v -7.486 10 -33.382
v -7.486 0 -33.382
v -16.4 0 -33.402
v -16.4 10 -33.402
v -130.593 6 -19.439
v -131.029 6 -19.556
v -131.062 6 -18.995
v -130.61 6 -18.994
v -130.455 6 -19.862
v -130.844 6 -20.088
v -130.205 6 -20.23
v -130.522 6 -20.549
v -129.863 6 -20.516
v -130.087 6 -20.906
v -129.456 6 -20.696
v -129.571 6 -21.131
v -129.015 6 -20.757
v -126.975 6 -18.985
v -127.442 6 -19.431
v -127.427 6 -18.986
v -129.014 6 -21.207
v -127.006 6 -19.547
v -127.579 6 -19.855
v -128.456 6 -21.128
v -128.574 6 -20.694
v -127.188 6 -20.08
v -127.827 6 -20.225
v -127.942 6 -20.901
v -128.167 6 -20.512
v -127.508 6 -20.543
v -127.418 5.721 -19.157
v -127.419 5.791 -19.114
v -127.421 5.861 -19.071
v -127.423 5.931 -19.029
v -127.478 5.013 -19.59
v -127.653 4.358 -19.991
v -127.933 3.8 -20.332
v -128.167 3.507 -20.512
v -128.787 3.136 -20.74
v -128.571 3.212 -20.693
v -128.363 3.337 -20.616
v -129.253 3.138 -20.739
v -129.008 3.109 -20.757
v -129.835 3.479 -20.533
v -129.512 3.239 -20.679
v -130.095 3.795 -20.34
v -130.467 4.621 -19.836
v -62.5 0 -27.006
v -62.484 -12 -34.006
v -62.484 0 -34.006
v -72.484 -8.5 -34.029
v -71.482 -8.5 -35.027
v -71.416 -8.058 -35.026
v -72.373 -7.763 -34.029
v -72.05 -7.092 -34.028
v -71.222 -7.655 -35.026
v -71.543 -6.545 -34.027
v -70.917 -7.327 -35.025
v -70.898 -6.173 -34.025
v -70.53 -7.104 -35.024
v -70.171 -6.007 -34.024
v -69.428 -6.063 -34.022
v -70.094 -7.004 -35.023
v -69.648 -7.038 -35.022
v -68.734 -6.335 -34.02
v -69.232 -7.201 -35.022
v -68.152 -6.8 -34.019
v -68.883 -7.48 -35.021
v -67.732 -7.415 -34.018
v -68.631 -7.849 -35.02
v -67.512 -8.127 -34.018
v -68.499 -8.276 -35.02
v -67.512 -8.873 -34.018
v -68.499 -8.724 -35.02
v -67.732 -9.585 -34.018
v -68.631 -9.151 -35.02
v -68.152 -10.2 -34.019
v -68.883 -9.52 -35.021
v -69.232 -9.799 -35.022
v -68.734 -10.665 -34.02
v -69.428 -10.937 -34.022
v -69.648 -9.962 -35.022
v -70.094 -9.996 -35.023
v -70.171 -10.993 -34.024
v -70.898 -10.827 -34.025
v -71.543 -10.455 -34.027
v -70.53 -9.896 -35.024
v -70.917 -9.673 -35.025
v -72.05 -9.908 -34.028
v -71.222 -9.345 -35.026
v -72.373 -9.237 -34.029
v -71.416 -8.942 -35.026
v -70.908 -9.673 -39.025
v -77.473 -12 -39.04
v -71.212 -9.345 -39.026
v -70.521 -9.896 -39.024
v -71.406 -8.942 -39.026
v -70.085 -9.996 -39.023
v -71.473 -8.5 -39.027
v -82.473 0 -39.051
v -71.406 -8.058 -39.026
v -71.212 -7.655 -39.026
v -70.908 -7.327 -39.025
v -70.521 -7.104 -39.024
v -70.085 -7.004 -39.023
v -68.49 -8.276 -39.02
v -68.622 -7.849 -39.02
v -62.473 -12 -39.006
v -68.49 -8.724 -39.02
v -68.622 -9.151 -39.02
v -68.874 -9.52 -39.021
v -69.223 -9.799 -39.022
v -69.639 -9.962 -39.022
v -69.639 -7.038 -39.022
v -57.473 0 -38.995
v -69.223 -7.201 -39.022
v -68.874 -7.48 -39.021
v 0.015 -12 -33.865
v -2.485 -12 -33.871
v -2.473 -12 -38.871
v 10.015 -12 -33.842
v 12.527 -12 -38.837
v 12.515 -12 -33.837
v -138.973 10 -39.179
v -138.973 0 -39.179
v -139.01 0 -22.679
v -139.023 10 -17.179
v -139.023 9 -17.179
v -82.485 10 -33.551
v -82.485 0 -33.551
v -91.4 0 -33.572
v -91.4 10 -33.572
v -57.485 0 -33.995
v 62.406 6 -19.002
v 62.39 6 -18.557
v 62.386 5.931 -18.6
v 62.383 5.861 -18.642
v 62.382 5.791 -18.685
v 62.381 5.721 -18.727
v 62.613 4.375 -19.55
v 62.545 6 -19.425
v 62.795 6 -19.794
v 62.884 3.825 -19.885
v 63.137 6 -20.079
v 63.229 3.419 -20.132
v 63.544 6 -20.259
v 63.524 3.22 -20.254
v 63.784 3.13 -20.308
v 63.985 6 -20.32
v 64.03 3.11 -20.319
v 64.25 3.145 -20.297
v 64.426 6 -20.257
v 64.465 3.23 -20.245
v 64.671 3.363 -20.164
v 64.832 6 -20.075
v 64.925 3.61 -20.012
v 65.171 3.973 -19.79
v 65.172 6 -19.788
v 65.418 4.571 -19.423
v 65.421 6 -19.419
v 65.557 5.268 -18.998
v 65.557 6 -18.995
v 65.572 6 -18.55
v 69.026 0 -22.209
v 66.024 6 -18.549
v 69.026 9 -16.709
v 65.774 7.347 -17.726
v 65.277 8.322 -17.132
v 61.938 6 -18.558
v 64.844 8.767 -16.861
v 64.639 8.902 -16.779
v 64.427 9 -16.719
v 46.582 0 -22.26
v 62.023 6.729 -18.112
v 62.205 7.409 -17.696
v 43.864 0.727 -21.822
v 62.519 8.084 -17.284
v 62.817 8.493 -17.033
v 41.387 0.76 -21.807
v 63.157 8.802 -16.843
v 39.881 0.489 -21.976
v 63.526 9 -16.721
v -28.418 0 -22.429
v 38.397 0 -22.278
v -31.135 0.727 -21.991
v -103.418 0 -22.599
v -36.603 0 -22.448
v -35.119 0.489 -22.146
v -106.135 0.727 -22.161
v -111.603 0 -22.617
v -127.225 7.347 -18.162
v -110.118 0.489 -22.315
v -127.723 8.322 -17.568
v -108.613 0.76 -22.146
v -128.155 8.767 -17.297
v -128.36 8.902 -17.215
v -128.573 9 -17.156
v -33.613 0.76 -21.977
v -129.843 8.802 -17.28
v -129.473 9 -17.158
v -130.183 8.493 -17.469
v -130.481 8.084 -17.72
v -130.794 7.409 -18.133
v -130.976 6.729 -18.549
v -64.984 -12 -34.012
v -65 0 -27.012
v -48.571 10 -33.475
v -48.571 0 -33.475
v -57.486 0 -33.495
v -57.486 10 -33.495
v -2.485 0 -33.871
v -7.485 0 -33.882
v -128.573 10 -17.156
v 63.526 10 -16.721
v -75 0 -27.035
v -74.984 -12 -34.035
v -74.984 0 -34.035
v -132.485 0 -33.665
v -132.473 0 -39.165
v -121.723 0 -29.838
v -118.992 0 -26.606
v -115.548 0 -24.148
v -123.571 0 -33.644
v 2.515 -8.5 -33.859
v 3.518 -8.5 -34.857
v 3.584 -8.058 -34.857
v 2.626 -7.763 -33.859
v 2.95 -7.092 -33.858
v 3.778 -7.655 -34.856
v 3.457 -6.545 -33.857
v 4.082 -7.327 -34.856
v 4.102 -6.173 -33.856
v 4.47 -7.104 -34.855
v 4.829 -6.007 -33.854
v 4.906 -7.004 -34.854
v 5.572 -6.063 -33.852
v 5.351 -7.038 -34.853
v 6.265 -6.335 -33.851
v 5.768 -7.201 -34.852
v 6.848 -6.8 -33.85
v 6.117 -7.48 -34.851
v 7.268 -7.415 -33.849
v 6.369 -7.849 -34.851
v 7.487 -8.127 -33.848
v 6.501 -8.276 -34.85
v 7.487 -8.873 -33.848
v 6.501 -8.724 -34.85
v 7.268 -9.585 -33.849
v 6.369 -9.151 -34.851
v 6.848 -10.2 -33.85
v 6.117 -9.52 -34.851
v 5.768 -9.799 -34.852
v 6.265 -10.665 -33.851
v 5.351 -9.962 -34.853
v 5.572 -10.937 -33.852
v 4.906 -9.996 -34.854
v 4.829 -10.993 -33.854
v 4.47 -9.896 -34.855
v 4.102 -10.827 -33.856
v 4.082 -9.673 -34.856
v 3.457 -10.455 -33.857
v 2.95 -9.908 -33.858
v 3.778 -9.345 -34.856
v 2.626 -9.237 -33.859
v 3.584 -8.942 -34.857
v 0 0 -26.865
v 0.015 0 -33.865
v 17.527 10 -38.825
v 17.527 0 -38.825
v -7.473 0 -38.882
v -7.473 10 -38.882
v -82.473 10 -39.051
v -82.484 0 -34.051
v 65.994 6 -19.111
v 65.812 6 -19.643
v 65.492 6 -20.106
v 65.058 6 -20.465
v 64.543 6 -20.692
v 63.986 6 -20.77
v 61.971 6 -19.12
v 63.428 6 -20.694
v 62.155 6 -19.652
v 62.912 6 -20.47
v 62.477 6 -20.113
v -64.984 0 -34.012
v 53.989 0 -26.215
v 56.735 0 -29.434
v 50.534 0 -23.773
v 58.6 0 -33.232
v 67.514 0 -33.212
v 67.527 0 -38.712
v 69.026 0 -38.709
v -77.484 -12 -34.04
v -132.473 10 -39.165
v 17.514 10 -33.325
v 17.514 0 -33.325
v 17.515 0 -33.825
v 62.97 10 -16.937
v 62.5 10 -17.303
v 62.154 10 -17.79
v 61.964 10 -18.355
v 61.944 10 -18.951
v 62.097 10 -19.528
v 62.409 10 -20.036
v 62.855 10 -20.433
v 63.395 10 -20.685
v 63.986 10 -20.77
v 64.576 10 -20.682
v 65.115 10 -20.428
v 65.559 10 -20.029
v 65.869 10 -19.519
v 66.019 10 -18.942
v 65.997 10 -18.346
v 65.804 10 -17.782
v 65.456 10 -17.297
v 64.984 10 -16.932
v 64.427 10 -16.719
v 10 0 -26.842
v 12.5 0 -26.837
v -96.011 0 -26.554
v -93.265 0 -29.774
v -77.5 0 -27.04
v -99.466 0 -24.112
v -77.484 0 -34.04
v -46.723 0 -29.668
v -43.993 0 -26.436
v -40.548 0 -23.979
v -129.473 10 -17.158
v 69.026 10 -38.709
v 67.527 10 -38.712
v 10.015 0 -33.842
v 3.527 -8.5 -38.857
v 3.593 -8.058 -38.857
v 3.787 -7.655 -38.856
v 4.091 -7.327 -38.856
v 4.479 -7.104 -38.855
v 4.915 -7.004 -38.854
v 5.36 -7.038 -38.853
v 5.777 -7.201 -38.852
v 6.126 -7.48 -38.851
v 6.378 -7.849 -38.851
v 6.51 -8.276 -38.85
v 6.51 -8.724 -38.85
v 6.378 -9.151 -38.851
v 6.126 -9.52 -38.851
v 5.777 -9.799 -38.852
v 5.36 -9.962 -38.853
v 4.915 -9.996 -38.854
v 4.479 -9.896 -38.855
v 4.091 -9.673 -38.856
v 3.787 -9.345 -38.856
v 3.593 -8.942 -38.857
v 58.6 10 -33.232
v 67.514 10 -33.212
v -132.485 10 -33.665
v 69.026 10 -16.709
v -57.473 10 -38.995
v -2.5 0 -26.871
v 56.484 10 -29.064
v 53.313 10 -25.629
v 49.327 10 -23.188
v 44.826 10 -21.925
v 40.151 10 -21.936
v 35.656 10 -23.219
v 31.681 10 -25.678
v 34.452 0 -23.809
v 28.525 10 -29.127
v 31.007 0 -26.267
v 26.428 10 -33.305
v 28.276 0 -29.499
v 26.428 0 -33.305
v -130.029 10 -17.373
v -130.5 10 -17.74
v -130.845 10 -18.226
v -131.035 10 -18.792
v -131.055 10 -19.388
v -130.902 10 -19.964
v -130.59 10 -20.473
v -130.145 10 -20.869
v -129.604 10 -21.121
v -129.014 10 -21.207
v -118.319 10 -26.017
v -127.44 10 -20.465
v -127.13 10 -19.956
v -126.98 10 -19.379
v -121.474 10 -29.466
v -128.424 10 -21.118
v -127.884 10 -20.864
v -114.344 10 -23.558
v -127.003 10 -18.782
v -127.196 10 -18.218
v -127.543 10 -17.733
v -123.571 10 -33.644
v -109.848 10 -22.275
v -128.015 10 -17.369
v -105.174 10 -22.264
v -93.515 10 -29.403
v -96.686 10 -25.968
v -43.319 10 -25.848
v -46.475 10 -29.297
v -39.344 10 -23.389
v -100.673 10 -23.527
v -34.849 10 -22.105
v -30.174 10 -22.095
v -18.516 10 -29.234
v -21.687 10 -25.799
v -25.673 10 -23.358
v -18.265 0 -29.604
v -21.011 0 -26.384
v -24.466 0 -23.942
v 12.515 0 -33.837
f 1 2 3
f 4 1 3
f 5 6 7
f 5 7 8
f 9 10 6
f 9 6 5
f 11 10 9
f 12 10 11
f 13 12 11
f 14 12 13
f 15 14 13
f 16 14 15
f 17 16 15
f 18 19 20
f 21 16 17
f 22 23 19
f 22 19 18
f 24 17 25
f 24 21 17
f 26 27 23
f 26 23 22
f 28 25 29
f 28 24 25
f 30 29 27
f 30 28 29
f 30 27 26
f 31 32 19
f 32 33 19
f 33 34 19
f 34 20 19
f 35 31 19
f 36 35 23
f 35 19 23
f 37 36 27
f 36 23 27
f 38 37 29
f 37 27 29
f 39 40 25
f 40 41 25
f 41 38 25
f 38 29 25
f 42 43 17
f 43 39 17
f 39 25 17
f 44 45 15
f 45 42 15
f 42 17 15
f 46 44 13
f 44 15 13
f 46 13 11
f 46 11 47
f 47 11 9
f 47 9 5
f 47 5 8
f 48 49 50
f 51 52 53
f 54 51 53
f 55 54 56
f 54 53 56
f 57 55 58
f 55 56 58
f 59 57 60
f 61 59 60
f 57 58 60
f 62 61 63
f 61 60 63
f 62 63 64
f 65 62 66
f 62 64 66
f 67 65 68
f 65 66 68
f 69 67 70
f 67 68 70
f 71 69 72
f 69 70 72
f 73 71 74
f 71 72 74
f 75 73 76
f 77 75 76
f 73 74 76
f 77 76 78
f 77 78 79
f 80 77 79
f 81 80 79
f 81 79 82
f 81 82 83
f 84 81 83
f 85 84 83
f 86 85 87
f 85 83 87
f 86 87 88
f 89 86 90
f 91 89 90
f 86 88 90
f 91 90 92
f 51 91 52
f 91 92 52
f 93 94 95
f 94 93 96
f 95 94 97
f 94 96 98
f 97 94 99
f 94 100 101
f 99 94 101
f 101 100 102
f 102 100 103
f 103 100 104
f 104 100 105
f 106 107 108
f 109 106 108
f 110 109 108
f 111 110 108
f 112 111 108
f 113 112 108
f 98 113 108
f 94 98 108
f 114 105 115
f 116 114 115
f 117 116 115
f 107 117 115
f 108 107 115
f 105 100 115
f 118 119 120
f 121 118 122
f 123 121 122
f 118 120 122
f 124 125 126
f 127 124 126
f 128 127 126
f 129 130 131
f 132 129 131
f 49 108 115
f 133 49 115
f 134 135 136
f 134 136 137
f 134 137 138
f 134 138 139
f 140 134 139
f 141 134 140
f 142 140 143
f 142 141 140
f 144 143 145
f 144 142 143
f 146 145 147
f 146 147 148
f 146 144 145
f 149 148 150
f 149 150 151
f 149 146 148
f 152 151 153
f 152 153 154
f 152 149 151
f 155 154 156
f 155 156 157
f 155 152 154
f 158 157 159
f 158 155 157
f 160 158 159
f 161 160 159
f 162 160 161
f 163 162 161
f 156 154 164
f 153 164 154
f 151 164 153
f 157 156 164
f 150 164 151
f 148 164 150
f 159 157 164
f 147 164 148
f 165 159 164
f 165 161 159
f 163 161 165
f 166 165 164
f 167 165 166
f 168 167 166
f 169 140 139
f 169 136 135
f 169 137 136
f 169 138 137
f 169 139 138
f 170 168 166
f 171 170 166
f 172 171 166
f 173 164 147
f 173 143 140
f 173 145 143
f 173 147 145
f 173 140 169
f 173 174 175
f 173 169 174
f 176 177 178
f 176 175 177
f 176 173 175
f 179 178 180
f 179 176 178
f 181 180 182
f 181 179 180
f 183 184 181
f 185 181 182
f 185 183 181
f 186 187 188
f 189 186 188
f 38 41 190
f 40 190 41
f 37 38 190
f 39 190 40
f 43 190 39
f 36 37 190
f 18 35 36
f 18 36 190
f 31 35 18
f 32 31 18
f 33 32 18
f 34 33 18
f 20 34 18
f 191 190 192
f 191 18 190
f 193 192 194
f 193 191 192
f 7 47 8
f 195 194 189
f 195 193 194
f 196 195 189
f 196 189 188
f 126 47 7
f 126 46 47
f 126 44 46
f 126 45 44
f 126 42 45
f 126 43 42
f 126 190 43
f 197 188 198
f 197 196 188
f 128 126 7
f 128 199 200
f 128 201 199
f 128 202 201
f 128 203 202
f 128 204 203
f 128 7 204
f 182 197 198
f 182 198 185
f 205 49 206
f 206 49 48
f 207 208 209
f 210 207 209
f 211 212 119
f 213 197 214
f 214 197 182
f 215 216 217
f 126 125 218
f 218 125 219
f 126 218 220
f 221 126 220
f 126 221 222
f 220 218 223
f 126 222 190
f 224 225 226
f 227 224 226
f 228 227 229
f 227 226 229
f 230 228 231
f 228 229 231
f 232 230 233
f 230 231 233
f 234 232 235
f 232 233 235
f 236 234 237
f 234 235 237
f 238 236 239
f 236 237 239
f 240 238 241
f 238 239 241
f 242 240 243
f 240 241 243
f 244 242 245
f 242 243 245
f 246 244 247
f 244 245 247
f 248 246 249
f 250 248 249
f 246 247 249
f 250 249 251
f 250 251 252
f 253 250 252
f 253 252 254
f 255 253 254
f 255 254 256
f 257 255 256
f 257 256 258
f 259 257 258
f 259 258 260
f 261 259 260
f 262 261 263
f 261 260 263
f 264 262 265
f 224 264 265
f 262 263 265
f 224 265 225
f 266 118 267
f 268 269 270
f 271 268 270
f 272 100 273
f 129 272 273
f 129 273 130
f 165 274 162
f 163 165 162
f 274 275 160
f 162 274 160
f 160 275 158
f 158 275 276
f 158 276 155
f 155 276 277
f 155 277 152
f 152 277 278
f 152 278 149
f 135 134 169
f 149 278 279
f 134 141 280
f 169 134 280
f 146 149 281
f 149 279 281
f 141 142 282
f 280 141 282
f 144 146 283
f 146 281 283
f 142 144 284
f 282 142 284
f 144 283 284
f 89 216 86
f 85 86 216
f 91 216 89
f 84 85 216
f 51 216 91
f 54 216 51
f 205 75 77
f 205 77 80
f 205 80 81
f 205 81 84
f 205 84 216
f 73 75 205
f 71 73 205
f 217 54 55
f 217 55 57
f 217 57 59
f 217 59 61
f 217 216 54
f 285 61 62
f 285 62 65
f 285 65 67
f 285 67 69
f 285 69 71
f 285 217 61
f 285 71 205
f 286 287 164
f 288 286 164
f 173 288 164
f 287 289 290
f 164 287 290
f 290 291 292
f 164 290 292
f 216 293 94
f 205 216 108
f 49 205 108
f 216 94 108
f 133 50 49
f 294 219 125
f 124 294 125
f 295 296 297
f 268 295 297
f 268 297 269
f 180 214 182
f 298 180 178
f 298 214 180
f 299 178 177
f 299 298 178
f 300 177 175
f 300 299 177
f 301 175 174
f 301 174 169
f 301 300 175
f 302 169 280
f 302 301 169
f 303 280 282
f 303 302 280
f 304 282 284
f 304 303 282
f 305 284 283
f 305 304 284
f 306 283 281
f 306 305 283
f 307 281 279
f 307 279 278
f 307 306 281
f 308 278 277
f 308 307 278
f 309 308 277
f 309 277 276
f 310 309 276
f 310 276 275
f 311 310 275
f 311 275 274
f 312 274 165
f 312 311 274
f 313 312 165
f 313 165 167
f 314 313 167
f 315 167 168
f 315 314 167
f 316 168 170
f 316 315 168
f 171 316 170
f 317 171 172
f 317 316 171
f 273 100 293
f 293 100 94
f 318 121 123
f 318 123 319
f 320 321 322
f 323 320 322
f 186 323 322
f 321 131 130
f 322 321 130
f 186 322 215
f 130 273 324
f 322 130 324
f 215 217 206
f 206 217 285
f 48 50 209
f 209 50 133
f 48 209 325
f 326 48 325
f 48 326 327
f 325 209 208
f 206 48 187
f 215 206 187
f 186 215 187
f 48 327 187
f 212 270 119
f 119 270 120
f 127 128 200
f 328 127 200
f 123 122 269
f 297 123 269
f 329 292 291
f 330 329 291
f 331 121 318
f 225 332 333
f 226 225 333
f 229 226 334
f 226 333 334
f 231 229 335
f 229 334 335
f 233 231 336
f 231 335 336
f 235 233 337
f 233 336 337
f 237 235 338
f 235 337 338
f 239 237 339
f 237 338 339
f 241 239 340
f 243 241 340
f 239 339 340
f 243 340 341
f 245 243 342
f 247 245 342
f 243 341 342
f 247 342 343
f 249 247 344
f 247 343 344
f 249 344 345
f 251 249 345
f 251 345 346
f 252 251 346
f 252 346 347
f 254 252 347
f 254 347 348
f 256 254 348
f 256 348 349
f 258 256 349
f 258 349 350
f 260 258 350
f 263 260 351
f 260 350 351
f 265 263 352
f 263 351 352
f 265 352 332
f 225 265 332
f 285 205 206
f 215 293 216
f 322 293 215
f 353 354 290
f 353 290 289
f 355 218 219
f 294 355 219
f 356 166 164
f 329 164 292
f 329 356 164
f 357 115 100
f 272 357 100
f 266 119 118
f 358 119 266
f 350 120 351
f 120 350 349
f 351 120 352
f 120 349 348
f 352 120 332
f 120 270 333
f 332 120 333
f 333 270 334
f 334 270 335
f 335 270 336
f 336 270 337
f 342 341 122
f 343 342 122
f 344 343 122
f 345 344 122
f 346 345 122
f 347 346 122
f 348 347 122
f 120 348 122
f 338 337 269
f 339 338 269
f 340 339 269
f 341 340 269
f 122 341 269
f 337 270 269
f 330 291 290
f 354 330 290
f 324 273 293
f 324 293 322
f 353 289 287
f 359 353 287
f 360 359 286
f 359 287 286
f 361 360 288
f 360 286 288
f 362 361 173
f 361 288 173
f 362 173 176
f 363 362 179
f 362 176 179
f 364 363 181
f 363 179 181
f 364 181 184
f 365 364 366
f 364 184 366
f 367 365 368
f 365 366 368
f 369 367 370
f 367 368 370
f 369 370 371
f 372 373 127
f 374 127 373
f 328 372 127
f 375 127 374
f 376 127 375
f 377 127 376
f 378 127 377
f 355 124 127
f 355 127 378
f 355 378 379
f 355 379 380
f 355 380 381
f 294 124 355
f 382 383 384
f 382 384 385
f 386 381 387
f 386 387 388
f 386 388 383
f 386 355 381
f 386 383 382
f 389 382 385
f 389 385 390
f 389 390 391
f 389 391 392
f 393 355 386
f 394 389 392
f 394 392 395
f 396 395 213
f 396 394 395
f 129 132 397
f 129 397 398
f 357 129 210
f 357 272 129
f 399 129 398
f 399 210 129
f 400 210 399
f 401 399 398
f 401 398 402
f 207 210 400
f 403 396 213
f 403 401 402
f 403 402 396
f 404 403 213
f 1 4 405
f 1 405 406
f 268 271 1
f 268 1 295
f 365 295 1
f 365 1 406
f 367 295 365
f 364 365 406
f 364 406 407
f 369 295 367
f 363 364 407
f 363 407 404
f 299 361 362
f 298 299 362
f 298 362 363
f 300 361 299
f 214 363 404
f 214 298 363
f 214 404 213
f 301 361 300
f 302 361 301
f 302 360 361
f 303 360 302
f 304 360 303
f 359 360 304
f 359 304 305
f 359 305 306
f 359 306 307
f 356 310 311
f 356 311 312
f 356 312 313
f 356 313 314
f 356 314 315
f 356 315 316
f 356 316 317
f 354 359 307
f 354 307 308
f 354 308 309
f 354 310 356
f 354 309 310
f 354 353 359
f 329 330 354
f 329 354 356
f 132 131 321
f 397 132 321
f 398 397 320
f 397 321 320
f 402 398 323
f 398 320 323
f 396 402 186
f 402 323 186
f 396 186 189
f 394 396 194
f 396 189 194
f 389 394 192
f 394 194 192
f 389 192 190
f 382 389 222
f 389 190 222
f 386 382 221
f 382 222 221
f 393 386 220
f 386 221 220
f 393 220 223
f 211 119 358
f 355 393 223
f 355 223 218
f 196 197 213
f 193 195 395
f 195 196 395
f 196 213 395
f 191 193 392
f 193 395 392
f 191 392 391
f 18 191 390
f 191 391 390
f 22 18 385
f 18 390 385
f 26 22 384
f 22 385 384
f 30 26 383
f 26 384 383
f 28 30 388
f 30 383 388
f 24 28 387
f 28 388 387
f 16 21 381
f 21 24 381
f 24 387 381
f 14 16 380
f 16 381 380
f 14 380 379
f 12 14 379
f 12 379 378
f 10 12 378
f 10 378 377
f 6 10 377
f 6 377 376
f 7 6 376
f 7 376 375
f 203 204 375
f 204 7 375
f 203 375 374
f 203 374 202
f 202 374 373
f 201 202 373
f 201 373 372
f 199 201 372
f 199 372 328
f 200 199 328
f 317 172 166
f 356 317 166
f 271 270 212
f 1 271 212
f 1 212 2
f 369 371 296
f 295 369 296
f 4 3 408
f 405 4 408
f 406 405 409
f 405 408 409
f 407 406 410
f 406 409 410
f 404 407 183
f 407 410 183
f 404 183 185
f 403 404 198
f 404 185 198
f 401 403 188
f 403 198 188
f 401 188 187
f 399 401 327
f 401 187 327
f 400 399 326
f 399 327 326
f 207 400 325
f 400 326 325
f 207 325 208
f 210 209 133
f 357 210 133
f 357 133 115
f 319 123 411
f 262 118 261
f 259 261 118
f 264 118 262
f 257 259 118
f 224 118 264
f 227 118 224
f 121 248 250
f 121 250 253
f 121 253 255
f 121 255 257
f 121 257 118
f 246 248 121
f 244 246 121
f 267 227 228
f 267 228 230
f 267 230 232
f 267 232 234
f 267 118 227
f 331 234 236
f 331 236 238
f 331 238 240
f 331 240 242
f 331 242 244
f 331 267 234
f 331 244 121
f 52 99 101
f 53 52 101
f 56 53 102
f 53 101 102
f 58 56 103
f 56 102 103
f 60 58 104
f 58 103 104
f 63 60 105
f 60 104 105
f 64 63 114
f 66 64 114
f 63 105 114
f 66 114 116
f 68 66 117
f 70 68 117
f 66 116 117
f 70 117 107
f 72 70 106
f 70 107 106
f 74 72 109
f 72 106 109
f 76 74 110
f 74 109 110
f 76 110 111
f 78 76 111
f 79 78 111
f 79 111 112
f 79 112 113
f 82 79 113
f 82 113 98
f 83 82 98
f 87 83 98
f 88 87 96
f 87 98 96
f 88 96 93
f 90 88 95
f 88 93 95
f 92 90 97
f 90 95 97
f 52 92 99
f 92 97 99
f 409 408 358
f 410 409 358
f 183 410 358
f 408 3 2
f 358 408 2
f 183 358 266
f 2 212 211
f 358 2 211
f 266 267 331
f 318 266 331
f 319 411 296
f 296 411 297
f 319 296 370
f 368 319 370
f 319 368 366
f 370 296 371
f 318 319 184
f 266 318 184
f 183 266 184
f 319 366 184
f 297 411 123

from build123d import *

# Parameters (mm, degrees)
BOSS_EXTRUDE3_DEPTH        = 10
SKETCH4_R                  = 1.5
BOSS_EXTRUDE4_DEPTH        = 5
RIB6_REACH                 = 158.985
SKETCH5_WALL_W             = 329.861950248
SKETCH5_WALL_H             = 2.5
CHAMFER2_SIZE              = 1
CHAMFER3_SIZE              = 5.5
CHAMFER3_SIZE_2            = 9
LPATTERN4_COUNT            = 2
LPATTERN4_PITCH            = 75
LPATTERN4_COPY_1_REACH     = 158.985
LPATTERN4_COPY_1_SKETCH_W  = 329.861950248
LPATTERN4_COPY_1_SKETCH_H  = 2.5
CHAMFER2_OF_LPATTERN4_SIZE = 1
SKETCH8_R                  = 2.05
CUT_EXTRUDE1_DEPTH         = 4
SKETCH9_R                  = 1.6
CUT_EXTRUDE2_DEPTH         = 5
SZKIC1_W                   = 8.551960468
SZKIC1_H                   = 23.590081372
WYTNIJ_WYCI_GNI_CIE3_DEPTH = 30.5


with BuildPart() as part:
    # Sketch2 → Boss-Extrude3 (new body)
    with BuildSketch(Plane(origin=(0, 0, 0), x_dir=(1, 0, 0), z_dir=(0, 1, 0))):
        with BuildLine():
            Line((-138.973021921, 39.179223473), (-139.022764358, 17.179279707))
            Line((-139.022764358, 17.179279707), (73.976691191, 16.697682479))
            Line((73.976691191, 16.697682479), (74.026978079, 38.697625014))
            Line((74.026978079, 38.697625014), (67.526578048, 38.712322585))
            Line((67.526578048, 38.712322585), (67.51414235, 33.212297518))
            Line((67.51414235, 33.212297518), (58.599731895, 33.232453229))
            ThreePointArc((58.599731895, 33.232453229), (42.488076808, 21.768891824), (26.428425, 33.305193378))
            Line((26.428425, 33.305193378), (17.51414235, 33.3253488))
            Line((17.51414235, 33.3253488), (17.526578048, 38.825373866))
            Line((17.526578048, 38.825373866), (-7.473230244, 38.881899074))
            Line((-7.473230244, 38.881899074), (-7.485665941, 33.381874007))
            Line((-7.485665941, 33.381874007), (-16.400076396, 33.402029717))
            ThreePointArc((-16.400076396, 33.402029717), (-32.511731484, 21.938468313), (-48.571383292, 33.474769867))
            Line((-48.571383292, 33.474769867), (-57.485665941, 33.494925288))
            Line((-57.485665941, 33.494925288), (-57.473230244, 38.994950355))
            Line((-57.473230244, 38.994950355), (-82.473038536, 39.051475562))
            Line((-82.473038536, 39.051475562), (-82.485474233, 33.551450496))
            Line((-82.485474233, 33.551450496), (-91.399884688, 33.571606206))
            ThreePointArc((-91.399884688, 33.571606206), (-107.511539776, 22.108044802), (-123.571191584, 33.644346356))
            Line((-123.571191584, 33.644346356), (-132.485474233, 33.664501777))
            Line((-132.485474233, 33.664501777), (-132.473038536, 39.164526844))
            Line((-132.473038536, 39.164526844), (-138.973021921, 39.179223473))
        make_face()
    extrude(amount=BOSS_EXTRUDE3_DEPTH)

    # Sketch4 → Boss-Extrude4 (add)
    with BuildSketch(Plane(origin=(0.087874316, 0, -38.864803222), x_dir=(-0.99999744389135, 0, -0.002261019850970016), z_dir=(0.002261019850970016, 0, -0.99999744389135))):
        Polygon((62.56118779, -12), (57.561251693, 0), (82.561123887, 0), (77.56118779, -12), align=None)
        with Locations((70.06118779, -8.5)):
            Circle(SKETCH4_R, mode=Mode.SUBTRACT)
    boss_extrude4 = extrude(amount=-BOSS_EXTRUDE4_DEPTH)

    # Sketch5 wall → Rib6 (add, up to next)
    with BuildSketch(Plane(origin=(-77.492333887, -6, -30.540192335), x_dir=(-0.001139262394, 0.863778900906, 0.503869737562), z_dir=(-0.001953021242, -0.503871025511, 0.863776692993)), mode=Mode.PRIVATE) as rib6_sk1:
        with Locations((0, -1.25)):
            Rectangle(SKETCH5_WALL_W, SKETCH5_WALL_H)
    rib6_tool1 = extrude(rib6_sk1.sketch, amount=-RIB6_REACH, mode=Mode.PRIVATE) - part.part
    rib6 = rib6_tool1.solids().sort_by_distance((-77.492333887, -6, -30.540192335))[0]
    add(rib6)

    # Mirror2: Rib6 across plane
    add(rib6.mirror(Plane(origin=(-70.061008706, 0, -0.158409736), x_dir=(-0.0022610198509701073, 0, 0.99999744389135), z_dir=(0.99999744389135, 0, 0.002261019850970107))))

    # Chamfer2
    chamfer2_edges = [part.edges().sort_by_distance(p)[0] for p in [
        (-68.484443323, -8.5, -34.01983421),
    ]]
    chamfer(chamfer2_edges, length=CHAMFER2_SIZE)

    # Chamfer3
    # the kernel refuses this chamfer: 9, 5.5 mm, written as the material it takes off along each edge
    with BuildSketch(Plane(origin=(-162.295390883, 0, -17.231899712), x_dir=(0.0022577295255832275, -0.053929224624231706, -0.9985422081158205), z_dir=(0.9999974438913499, 0, 0.0022610198509699707))) as chamfer3_piece_1:
        Polygon((CHAMFER3_SIZE * 0.998544760505, CHAMFER3_SIZE * 0.0539292246242), (-CHAMFER3_SIZE_2 * 0.0539292246242, CHAMFER3_SIZE_2 * 0.998544760505), (0, 0), align=None)
    extrude(amount=259.545372026, mode=Mode.SUBTRACT)

    # LPattern4: Boss-Extrude4, Rib6 ×2
    with Locations(*[Vector(0.9999974438913499, 0, 0.0022610198509701) * (i * LPATTERN4_PITCH) for i in range(1, LPATTERN4_COUNT)]):
        add(boss_extrude4)
        add(rib6)

    # LPattern4 copy 1 sketch → LPattern4 copy 1 (add, up to next)
    with BuildSketch(Plane(origin=(12.507436062, -6, -30.336700548), x_dir=(-0.0011392623880184954, 0.863778900906, 0.5038697375620136), z_dir=(-0.0019530212415939509, -0.503871025511, 0.863776692993001)), mode=Mode.PRIVATE) as lpattern4_copy_1_sk1:
        with Locations((0, 1.25)):
            Rectangle(LPATTERN4_COPY_1_SKETCH_W, LPATTERN4_COPY_1_SKETCH_H)
    lpattern4_copy_1_tool1 = extrude(lpattern4_copy_1_sk1.sketch, amount=-LPATTERN4_COPY_1_REACH, mode=Mode.PRIVATE) - part.part
    add(lpattern4_copy_1_tool1.solids().sort_by_distance((12.507436062, -6, -30.336700548))[0])

    # Chamfer2 of LPattern4
    chamfer2_of_lpattern4_edges = [part.edges().sort_by_distance(p)[0] for p in [
        (6.515364969, -8.5, -33.850257721),
    ]]
    chamfer(chamfer2_of_lpattern4_edges, length=CHAMFER2_OF_LPATTERN4_SIZE)

    # Sketch8 → Cut-Extrude1 (cut)
    with BuildSketch(Plane(origin=(0, 10, 0), x_dir=(1, 0, 0), z_dir=(0, 1, 0))):
        with Locations((-129.018242433, 19.156613217)):
            Circle(SKETCH8_R)
    cut_extrude1 = extrude(amount=-CUT_EXTRUDE1_DEPTH, mode=Mode.SUBTRACT)

    # Sketch9 → Cut-Extrude2 (cut)
    with BuildSketch(Plane(origin=(0, 6, 0), x_dir=(1, 0, 0), z_dir=(0, 1, 0))):
        with Locations((-129.018242433, 19.156613217)):
            Circle(SKETCH9_R)
    cut_extrude2 = extrude(amount=-CUT_EXTRUDE2_DEPTH, mode=Mode.SUBTRACT)

    # Mirror4: Cut-Extrude1, Cut-Extrude2 across plane
    add(cut_extrude1.mirror(Plane(origin=(-32.561168463, 0, -0.073621636), x_dir=(-0.002261019850969509, 0, 0.99999744389135), z_dir=(-0.99999744389135, 0, -0.0022610198509695084))), mode=Mode.SUBTRACT)
    add(cut_extrude2.mirror(Plane(origin=(-32.561168463, 0, -0.073621636), x_dir=(-0.002261019850969509, 0, 0.99999744389135), z_dir=(-0.99999744389135, 0, -0.0022610198509695084))), mode=Mode.SUBTRACT)

    # Szkic1 → Wytnij-wyciągnięcie3 (cut)
    with BuildSketch(Plane(origin=(0, 10, 0), x_dir=(1, 0, 0), z_dir=(0, 1, 0))):
        with Locations((73.302426643, 26.913890658)):
            Rectangle(SZKIC1_W, SZKIC1_H)
    extrude(amount=-WYTNIJ_WYCI_GNI_CIE3_DEPTH, mode=Mode.SUBTRACT)


solid = part.part
